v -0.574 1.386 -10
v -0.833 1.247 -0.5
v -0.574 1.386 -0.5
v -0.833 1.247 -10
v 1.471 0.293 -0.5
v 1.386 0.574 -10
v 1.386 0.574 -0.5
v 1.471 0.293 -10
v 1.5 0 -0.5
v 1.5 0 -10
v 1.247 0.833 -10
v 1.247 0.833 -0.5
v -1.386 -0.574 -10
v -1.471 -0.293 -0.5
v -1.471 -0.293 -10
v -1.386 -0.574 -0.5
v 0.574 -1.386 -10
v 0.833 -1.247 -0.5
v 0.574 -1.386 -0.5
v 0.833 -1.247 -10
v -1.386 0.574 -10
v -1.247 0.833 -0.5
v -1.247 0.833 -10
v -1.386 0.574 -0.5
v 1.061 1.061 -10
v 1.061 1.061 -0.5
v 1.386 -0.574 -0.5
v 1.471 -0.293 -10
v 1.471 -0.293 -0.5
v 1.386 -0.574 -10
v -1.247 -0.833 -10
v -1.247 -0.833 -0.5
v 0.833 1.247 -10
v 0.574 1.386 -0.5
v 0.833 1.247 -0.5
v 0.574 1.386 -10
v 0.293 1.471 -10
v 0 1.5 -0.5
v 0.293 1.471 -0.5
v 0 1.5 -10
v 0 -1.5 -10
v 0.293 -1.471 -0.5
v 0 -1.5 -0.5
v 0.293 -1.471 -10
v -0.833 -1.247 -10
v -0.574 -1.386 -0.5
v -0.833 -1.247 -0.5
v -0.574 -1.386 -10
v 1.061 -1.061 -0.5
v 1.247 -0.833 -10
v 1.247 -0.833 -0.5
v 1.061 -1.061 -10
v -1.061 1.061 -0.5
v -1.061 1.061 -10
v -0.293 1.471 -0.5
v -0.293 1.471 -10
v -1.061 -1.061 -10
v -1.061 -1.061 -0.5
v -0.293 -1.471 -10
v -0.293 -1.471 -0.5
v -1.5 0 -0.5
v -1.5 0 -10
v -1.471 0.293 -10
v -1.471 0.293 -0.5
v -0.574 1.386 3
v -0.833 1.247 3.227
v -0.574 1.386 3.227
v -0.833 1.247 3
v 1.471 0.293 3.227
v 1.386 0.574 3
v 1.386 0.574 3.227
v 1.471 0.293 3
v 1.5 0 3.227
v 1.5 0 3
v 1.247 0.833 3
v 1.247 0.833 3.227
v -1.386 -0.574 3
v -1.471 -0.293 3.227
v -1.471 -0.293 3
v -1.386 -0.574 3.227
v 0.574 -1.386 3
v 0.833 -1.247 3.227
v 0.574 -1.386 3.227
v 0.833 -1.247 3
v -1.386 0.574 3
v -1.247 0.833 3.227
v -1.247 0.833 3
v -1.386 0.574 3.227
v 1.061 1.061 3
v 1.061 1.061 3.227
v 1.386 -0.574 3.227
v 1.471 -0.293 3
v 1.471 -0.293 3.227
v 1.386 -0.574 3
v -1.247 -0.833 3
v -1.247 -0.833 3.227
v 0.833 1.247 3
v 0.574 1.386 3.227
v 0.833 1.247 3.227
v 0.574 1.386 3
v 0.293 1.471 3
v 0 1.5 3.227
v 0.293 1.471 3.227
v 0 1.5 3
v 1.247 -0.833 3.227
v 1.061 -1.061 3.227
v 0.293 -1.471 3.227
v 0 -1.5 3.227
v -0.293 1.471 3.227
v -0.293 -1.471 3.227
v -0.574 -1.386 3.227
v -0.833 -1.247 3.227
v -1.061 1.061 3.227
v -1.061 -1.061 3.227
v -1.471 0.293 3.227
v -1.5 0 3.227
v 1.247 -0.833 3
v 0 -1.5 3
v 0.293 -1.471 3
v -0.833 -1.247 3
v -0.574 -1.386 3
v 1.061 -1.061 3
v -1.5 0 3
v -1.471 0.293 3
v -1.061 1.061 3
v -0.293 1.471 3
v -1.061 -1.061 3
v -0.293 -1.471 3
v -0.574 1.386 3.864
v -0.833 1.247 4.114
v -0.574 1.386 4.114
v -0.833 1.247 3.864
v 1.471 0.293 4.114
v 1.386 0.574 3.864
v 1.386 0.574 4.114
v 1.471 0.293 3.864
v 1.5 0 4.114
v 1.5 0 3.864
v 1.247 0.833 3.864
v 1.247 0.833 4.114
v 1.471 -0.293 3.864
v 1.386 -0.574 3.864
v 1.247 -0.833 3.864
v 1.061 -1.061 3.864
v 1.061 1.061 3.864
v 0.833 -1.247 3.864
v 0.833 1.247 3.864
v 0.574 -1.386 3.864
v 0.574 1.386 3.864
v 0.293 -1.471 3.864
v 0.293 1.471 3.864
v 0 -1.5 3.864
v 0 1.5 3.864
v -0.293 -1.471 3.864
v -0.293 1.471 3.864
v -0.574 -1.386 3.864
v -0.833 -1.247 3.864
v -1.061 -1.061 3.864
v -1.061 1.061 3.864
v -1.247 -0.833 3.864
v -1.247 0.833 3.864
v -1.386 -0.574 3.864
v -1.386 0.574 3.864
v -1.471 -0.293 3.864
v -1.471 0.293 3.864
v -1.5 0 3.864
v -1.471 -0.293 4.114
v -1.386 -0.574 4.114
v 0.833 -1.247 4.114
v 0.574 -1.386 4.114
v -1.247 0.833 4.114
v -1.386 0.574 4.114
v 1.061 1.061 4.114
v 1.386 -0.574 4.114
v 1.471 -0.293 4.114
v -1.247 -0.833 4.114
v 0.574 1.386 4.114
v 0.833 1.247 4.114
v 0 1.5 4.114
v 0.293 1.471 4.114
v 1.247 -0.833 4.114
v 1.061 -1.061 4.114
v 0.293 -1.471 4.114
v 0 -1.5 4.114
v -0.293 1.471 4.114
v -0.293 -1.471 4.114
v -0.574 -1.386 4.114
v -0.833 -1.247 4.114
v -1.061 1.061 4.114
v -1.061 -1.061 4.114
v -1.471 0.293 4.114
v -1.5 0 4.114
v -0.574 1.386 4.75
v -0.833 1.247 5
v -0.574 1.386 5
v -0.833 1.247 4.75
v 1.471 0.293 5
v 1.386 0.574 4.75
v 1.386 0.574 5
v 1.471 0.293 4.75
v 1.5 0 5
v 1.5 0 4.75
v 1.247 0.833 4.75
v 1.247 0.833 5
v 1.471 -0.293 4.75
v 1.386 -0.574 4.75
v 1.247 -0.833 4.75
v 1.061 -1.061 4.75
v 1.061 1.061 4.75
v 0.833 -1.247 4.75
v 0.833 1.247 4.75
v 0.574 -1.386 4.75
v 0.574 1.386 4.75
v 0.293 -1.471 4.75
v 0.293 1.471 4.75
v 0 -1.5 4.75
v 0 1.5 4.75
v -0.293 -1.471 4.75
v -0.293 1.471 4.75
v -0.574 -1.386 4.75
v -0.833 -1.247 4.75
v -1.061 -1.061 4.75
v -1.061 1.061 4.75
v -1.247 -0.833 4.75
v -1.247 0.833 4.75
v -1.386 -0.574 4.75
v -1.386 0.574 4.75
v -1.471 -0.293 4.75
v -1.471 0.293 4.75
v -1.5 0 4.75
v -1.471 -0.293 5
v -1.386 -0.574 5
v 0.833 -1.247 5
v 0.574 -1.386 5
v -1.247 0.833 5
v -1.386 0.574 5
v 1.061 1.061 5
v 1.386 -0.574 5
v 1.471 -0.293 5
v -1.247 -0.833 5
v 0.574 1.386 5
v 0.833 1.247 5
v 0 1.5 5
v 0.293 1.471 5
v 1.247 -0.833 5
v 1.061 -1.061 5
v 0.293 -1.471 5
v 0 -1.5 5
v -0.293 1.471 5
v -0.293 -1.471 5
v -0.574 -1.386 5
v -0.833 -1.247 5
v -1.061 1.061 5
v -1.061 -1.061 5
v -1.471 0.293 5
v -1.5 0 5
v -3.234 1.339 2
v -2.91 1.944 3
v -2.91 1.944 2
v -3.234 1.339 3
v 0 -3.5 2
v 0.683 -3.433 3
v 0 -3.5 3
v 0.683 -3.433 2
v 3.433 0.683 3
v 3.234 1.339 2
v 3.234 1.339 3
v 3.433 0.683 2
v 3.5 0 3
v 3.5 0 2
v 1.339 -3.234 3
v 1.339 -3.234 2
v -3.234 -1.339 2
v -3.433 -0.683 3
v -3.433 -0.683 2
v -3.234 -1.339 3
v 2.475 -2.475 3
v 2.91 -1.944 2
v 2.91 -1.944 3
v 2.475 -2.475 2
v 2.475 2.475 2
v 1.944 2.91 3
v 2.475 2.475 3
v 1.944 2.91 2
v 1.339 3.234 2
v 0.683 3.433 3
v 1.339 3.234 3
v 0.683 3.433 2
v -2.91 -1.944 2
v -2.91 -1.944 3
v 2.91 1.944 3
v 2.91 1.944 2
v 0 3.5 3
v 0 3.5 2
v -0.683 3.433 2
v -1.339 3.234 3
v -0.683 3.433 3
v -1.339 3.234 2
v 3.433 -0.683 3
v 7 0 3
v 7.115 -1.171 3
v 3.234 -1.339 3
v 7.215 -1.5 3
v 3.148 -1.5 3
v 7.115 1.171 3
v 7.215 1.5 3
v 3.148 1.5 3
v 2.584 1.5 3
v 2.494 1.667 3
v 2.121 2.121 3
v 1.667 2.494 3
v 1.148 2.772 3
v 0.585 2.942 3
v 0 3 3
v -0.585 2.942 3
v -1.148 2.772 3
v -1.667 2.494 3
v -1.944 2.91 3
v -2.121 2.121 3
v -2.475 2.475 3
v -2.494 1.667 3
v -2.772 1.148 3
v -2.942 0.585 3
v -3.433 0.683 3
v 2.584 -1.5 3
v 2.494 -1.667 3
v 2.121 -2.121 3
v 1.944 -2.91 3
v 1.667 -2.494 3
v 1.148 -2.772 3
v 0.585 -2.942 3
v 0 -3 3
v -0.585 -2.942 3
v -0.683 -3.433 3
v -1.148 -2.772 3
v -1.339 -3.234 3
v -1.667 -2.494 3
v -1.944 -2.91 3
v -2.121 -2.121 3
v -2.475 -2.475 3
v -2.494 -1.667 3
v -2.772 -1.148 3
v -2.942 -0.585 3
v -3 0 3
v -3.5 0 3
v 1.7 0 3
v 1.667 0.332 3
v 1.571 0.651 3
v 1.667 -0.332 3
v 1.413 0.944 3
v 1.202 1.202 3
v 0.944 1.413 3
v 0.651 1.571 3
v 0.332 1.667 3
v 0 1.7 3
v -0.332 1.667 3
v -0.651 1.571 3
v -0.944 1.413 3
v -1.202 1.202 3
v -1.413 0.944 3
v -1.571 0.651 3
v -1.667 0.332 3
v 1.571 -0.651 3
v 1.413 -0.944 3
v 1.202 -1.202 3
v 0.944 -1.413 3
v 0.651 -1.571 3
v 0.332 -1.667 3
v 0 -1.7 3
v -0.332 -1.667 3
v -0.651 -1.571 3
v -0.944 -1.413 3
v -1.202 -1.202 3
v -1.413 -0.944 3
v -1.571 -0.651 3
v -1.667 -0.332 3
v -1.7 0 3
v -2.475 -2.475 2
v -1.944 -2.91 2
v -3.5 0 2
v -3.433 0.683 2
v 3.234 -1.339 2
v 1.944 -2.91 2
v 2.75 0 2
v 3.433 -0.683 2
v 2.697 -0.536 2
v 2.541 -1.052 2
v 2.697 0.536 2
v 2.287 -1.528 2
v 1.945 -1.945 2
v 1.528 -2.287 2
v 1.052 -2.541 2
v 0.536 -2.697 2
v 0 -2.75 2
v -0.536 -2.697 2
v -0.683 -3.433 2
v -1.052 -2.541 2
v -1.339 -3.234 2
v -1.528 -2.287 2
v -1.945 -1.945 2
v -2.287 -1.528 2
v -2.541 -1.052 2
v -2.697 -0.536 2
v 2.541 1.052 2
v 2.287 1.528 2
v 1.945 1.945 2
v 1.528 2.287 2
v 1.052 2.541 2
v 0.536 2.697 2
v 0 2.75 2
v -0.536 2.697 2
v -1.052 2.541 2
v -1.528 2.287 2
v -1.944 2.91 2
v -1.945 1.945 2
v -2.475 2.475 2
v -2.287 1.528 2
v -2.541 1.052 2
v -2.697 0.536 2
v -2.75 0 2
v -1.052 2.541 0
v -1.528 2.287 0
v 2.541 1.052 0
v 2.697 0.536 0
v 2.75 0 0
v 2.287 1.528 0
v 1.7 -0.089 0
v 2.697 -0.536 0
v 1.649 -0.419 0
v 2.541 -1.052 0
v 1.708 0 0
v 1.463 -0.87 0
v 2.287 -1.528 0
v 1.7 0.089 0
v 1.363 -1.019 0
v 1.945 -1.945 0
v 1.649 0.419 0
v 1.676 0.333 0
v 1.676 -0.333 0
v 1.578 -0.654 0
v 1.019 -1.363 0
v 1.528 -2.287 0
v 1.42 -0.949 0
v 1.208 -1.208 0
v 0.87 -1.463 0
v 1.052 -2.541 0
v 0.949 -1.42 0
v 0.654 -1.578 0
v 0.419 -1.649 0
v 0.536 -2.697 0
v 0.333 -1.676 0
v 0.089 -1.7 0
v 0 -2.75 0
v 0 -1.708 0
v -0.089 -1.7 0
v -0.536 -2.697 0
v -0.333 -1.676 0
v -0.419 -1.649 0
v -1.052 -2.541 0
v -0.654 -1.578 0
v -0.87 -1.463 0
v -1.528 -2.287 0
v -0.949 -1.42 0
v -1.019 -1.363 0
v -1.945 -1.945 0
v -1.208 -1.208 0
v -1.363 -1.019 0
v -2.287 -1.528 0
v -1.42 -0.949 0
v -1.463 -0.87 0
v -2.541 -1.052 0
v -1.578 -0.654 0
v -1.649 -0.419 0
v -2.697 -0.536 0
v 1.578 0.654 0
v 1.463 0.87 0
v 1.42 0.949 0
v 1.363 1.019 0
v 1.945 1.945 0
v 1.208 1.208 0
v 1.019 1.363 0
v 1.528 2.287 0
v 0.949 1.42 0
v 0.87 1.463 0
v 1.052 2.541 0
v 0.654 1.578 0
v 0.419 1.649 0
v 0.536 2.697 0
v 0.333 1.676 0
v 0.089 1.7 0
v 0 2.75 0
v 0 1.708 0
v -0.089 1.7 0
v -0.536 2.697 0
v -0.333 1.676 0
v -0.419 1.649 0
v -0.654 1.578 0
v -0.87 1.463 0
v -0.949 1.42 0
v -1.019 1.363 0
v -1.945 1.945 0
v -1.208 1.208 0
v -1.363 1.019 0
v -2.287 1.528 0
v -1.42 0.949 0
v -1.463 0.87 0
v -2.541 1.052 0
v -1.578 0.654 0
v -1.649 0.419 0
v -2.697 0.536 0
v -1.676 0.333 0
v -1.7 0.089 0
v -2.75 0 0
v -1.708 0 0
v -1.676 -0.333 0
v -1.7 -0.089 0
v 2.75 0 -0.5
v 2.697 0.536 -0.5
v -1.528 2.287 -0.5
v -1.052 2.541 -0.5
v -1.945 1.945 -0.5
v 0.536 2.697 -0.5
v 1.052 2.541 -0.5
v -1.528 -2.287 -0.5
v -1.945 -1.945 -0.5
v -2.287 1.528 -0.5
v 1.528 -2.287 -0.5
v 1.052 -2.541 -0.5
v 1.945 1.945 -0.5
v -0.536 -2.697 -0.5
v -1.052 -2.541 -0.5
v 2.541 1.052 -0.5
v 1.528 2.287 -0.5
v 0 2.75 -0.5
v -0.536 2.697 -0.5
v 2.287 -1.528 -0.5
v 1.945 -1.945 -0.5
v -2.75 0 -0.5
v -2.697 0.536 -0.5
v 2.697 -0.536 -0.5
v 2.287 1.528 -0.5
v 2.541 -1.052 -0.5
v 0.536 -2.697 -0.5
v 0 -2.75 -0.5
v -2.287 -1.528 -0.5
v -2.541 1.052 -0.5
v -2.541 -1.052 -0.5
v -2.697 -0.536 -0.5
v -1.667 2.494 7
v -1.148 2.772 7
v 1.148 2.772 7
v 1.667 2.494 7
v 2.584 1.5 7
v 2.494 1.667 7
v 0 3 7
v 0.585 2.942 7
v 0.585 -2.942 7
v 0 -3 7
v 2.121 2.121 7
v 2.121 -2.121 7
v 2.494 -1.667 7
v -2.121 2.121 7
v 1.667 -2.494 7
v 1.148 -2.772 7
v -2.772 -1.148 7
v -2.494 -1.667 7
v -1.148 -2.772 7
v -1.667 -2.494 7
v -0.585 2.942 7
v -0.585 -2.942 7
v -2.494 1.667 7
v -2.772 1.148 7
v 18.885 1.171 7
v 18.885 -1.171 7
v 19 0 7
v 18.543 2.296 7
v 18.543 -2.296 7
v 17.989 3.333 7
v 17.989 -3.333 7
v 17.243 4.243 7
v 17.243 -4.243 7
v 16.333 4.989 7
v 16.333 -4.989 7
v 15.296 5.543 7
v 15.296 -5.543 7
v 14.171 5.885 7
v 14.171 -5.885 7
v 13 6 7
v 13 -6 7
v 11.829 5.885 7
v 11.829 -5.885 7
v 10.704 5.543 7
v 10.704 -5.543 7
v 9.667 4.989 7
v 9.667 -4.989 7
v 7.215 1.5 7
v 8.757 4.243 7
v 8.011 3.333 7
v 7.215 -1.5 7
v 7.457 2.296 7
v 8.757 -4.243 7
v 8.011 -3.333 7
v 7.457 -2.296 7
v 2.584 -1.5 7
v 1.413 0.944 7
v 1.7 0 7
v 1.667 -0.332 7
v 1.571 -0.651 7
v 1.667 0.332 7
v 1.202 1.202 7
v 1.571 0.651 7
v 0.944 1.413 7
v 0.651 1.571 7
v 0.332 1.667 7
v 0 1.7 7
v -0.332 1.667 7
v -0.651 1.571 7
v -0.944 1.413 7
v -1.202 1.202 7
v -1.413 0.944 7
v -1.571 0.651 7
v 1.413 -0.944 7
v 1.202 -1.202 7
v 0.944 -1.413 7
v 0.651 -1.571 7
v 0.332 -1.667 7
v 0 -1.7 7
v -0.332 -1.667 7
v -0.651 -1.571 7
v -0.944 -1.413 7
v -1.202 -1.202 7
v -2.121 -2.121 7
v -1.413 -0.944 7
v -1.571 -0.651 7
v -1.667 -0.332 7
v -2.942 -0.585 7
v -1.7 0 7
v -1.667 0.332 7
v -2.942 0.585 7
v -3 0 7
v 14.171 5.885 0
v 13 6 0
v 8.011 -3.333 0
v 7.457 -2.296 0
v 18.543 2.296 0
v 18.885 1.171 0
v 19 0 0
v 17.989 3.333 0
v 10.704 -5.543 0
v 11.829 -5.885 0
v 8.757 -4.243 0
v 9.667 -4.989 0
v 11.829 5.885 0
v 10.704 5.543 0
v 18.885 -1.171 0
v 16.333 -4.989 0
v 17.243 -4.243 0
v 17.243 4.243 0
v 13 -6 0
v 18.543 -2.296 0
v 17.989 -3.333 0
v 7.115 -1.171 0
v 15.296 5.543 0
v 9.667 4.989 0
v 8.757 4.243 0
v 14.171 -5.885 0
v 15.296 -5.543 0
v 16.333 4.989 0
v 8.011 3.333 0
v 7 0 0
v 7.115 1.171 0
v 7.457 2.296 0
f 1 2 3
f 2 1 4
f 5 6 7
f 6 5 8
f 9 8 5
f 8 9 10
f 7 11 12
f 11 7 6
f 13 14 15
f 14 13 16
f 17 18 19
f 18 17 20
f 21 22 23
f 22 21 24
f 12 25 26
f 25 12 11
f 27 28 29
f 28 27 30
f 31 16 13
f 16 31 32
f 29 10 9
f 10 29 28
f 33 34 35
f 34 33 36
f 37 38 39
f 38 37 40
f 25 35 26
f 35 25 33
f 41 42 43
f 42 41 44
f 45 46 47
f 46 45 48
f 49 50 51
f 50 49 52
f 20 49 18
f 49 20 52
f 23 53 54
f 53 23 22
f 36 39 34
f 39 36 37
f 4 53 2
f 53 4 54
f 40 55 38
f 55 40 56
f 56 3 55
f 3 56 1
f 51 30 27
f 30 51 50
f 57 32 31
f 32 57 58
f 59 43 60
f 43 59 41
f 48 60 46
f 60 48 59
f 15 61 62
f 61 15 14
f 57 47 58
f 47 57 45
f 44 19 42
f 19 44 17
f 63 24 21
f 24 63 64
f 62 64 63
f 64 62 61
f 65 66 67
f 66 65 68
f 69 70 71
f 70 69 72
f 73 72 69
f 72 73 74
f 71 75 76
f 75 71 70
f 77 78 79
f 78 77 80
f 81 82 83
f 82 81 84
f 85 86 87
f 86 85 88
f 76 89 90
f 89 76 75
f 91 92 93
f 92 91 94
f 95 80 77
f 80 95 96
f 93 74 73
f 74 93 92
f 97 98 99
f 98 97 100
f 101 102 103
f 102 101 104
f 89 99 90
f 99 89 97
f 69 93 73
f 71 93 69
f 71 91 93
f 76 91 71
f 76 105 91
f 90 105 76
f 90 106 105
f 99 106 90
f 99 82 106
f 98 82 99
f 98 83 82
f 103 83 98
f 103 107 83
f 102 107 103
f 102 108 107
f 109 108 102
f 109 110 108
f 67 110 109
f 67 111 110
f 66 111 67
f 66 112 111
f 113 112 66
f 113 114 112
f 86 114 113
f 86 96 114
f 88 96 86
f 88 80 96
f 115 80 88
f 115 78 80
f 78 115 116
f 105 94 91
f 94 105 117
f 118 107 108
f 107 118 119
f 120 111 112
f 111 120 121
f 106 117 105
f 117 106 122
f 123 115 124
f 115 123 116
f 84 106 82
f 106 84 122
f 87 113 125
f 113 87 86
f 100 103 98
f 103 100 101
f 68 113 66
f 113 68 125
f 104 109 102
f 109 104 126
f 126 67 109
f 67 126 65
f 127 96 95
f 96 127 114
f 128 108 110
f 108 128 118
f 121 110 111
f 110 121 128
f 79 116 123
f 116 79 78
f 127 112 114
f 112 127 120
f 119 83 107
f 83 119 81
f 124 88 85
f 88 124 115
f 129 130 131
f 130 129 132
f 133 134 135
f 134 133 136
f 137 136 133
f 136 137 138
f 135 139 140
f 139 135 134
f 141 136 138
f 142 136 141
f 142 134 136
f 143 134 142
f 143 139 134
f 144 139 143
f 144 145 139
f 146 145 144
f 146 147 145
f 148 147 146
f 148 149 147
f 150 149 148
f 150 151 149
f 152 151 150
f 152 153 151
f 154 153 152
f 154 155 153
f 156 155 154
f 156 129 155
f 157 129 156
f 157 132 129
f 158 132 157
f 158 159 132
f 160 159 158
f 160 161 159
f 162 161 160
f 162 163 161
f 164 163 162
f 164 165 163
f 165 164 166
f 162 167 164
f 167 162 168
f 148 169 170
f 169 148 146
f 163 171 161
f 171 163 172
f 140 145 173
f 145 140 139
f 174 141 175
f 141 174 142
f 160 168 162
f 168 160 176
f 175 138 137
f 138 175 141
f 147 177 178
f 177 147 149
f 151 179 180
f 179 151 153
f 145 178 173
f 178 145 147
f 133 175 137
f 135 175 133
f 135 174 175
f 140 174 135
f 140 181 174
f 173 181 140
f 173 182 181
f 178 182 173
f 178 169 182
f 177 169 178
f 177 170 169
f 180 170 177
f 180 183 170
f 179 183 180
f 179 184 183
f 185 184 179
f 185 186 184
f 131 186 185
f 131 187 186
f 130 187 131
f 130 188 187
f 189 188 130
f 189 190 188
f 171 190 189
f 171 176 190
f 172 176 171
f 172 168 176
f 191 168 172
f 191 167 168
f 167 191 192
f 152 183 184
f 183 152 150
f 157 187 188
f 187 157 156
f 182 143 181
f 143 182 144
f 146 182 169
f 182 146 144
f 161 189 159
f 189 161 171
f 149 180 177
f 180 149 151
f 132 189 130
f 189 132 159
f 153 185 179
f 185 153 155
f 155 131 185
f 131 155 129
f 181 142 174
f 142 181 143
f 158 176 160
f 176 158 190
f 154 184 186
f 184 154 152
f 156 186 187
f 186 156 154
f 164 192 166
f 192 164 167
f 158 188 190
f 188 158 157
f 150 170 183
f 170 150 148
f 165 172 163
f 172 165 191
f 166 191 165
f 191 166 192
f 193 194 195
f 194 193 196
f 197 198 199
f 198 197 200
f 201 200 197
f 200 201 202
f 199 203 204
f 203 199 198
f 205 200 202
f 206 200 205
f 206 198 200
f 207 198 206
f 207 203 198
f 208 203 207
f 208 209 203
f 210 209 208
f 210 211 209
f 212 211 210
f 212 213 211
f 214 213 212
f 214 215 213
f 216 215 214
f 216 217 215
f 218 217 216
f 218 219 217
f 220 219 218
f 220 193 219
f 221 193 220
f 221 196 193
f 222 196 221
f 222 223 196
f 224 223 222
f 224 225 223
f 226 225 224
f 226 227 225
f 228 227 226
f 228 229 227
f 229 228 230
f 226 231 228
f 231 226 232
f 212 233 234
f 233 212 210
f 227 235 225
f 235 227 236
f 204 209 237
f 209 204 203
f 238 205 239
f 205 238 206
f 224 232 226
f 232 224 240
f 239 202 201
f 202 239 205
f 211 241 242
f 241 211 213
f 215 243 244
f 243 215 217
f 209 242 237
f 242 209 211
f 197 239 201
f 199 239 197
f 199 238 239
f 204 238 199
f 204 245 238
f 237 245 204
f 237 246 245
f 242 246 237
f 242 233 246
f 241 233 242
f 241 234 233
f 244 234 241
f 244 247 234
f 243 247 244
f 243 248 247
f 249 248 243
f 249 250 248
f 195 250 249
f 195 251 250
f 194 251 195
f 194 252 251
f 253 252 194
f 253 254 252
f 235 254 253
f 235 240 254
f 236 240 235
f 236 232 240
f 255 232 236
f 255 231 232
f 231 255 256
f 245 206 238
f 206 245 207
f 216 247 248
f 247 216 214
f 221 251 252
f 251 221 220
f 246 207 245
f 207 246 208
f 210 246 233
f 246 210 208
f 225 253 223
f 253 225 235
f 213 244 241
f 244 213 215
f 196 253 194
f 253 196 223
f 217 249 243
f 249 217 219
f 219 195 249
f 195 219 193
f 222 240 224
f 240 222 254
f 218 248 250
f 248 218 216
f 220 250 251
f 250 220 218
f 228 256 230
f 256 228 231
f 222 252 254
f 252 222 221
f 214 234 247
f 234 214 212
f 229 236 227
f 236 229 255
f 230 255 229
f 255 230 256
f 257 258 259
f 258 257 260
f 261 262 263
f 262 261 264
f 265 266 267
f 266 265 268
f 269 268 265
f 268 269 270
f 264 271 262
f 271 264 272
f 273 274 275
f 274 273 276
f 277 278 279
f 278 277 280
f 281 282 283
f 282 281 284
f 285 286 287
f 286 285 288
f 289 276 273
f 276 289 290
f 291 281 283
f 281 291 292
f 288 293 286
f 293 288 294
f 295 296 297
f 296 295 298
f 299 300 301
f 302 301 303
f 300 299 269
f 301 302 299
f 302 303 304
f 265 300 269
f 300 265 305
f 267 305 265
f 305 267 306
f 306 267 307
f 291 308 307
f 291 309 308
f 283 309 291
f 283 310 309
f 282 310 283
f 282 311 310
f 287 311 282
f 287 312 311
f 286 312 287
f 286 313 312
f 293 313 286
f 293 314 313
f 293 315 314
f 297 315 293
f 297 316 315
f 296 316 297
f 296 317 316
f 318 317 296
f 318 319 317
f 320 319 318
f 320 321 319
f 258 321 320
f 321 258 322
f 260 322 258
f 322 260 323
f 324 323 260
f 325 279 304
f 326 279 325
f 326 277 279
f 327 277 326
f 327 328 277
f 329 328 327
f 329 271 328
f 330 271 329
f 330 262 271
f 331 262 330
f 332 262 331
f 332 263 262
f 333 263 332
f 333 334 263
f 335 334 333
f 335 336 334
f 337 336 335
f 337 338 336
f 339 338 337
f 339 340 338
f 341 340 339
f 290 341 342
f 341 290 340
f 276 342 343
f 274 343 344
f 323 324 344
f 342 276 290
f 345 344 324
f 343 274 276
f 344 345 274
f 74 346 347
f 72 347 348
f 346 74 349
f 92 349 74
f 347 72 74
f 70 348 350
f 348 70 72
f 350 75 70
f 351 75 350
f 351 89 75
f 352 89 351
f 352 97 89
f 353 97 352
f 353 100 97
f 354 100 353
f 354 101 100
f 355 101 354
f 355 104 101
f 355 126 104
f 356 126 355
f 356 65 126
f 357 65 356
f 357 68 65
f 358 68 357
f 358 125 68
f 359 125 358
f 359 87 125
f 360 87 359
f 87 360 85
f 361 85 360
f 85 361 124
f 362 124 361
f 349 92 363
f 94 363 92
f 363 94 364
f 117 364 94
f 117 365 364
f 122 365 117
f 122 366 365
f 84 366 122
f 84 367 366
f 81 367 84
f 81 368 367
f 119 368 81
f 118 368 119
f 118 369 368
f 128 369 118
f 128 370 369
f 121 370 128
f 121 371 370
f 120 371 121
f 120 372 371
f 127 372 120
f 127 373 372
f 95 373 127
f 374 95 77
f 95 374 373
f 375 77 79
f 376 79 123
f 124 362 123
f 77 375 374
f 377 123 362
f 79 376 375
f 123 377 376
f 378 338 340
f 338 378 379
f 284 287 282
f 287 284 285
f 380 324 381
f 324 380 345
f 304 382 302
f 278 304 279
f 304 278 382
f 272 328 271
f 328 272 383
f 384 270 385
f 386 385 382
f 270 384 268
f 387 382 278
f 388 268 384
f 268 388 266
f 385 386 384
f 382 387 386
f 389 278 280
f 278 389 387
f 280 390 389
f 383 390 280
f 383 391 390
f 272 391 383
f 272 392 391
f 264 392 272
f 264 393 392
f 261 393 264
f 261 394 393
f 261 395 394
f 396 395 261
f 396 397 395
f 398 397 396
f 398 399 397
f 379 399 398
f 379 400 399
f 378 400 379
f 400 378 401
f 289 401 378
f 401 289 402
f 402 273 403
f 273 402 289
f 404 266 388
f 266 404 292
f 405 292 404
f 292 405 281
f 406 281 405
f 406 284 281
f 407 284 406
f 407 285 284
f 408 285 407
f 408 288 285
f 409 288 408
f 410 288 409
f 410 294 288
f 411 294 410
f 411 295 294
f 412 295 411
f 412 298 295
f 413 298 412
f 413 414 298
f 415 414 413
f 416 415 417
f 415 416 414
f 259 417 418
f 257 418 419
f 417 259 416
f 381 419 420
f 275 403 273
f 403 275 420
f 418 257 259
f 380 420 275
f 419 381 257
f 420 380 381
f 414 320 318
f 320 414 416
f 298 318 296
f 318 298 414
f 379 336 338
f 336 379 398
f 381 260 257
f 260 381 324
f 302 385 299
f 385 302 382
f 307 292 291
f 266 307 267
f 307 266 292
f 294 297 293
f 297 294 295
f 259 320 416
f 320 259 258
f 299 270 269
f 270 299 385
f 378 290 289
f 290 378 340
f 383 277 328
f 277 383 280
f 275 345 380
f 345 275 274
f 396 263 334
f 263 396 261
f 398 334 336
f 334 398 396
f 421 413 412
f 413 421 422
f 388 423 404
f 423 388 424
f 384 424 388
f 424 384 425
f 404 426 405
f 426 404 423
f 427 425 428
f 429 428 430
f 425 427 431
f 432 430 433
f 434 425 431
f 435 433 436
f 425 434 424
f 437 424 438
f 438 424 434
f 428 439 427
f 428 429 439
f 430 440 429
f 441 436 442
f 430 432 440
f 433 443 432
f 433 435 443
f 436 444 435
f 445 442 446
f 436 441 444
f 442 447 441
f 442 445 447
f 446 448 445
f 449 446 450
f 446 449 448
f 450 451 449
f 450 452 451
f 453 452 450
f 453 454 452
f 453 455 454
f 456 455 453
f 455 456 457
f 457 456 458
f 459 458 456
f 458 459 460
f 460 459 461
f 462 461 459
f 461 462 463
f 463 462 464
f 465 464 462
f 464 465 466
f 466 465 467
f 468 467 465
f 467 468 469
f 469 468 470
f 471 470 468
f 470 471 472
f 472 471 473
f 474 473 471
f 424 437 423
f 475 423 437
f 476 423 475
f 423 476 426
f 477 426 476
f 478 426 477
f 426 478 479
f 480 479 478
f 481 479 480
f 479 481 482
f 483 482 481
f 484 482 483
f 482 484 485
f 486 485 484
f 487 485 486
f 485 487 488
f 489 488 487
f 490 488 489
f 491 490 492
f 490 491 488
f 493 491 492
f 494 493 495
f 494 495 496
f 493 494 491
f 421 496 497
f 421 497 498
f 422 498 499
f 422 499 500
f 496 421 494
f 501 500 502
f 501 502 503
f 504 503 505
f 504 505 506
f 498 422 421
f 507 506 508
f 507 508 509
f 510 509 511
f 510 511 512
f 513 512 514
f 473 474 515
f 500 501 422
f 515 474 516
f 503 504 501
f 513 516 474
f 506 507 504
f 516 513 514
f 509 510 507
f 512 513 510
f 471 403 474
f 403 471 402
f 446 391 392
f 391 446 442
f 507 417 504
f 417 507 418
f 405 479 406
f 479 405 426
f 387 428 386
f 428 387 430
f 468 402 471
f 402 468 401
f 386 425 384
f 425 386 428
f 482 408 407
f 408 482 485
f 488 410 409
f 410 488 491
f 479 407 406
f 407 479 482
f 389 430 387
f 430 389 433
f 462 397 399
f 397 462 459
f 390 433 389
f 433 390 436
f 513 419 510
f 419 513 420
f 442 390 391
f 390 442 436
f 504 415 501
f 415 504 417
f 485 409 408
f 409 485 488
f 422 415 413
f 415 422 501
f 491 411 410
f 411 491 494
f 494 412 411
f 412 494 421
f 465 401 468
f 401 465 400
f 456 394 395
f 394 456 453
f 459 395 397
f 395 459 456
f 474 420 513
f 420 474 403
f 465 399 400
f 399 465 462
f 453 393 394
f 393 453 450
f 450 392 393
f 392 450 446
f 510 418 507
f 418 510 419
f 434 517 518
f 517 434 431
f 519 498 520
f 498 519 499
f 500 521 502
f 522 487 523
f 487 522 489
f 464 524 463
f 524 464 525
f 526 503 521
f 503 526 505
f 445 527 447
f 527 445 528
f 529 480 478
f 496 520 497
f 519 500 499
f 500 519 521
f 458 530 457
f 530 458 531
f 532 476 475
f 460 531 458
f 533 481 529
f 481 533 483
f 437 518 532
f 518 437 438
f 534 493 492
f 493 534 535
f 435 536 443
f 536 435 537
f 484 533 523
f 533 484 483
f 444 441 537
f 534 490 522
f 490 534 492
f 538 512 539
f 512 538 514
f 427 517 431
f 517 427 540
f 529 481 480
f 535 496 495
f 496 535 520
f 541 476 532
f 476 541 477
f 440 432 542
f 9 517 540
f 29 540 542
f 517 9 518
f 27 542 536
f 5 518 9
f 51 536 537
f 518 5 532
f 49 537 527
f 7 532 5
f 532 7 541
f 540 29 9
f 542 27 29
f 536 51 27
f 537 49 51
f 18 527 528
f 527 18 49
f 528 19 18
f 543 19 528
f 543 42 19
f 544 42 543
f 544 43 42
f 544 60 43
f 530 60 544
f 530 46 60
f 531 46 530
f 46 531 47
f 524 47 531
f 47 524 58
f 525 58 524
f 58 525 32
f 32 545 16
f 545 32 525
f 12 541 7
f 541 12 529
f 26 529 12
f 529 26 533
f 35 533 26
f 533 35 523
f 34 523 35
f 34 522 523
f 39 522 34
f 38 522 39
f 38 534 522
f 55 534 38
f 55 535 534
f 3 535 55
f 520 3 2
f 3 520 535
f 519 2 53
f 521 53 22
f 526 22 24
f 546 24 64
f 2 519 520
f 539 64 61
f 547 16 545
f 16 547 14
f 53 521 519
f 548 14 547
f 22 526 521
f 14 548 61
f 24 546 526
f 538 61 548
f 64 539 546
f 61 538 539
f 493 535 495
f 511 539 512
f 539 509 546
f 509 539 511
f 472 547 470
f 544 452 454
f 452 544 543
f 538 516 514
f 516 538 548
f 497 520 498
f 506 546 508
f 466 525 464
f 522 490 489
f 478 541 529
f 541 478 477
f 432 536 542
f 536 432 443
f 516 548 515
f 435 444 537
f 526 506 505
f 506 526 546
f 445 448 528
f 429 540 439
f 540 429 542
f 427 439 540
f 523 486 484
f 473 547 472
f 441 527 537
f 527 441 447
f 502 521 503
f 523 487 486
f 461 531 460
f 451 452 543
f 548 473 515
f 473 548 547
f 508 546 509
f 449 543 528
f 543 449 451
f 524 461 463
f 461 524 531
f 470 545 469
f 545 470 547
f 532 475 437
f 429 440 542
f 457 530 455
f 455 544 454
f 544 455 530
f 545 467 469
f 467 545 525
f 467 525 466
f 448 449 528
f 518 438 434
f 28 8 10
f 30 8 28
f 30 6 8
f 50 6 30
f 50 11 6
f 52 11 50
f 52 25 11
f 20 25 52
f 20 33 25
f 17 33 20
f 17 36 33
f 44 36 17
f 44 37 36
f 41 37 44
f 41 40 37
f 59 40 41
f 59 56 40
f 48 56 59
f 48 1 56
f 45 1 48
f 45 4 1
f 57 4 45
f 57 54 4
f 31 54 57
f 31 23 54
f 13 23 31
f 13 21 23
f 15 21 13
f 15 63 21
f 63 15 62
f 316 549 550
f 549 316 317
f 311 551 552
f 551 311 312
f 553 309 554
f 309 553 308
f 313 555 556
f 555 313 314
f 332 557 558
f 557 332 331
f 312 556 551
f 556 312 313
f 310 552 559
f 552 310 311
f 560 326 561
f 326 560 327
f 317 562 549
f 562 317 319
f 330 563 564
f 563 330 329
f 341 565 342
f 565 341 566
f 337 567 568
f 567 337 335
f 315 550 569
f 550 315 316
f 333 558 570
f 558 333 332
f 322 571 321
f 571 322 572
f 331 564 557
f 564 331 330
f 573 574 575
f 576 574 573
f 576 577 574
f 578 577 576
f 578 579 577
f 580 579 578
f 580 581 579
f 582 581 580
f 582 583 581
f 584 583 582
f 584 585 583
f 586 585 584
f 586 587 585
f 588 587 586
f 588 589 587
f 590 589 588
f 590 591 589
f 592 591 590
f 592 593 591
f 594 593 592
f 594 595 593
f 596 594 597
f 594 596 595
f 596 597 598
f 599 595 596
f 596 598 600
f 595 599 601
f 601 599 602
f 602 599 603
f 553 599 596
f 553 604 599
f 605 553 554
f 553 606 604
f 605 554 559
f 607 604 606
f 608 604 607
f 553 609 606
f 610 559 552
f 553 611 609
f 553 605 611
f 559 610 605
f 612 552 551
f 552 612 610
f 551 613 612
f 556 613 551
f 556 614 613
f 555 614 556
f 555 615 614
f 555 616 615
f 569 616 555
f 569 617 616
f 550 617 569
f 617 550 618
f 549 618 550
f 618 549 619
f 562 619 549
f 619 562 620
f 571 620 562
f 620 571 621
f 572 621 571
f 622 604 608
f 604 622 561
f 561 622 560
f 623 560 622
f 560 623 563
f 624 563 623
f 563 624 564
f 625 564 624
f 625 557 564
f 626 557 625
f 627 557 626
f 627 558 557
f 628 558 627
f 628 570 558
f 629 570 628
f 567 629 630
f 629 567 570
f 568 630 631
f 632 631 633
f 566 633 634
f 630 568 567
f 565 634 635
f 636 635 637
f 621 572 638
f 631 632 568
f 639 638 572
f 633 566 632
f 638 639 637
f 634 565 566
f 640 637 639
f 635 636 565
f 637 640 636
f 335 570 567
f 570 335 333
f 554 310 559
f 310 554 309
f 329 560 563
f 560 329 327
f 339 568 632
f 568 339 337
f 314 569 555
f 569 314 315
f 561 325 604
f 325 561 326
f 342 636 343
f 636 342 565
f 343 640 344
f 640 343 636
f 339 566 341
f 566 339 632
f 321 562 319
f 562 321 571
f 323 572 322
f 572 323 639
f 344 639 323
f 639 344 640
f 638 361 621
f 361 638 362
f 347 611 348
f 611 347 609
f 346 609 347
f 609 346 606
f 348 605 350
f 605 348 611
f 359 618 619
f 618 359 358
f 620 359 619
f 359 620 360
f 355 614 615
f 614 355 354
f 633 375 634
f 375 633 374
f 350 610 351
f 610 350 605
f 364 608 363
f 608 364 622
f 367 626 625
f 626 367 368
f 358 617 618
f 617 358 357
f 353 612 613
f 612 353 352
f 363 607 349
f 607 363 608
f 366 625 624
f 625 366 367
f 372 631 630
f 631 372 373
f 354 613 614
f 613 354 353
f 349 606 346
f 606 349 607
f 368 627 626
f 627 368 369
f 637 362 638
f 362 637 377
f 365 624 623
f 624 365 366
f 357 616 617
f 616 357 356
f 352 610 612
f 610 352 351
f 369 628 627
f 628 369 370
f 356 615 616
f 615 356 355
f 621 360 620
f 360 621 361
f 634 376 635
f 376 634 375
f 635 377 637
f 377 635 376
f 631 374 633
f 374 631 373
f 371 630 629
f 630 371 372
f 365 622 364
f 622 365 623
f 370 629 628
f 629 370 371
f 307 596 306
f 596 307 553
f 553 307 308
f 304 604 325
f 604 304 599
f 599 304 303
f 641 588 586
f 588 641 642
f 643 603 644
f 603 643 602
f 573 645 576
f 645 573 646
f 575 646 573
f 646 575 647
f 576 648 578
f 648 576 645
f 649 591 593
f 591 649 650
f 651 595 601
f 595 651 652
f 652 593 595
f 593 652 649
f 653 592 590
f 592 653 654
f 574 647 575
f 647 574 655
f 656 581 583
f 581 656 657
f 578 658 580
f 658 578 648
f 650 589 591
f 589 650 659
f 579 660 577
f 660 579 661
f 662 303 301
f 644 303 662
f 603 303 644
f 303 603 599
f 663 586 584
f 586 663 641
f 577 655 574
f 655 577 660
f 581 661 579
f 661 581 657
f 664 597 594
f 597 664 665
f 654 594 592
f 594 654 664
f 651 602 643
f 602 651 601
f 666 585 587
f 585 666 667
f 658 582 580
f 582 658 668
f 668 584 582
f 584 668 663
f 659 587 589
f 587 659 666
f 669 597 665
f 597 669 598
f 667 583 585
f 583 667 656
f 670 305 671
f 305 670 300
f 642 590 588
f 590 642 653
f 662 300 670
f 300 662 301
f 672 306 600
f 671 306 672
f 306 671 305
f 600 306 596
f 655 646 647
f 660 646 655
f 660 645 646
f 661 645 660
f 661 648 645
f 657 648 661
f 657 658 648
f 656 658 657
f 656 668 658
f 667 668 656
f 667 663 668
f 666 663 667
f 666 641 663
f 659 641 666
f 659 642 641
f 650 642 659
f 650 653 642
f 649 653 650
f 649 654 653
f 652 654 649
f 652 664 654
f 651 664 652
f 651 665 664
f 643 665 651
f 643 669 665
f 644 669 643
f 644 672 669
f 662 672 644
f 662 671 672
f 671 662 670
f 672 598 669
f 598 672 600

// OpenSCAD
// Parameters
thread_major_diameter_mm = 3; //[1.5:6:0.1]
overall_length_mm = 10; //[5:20:0.5]
head_diameter_mm = 5.5; //[2.75:11:0.1]
head_height_mm = 3; //[1.5:6:0.1]
thread_pitch_mm = 0.5; //[0.25:1:0.05]
thread_length_mm = 10; //[5:20:0.5]
socket_across_flats_mm = 2.5; //[1.25:5:0.05]
socket_depth_mm = 1.5; //[0.75:3:0.05]
chamfer_under_head_mm = 0.6; //[0.3:1.2:0.05]
thread_minor_diameter_mm = 2.6; //[1.3:5.2:0.1]
thread_ridge_height_mm = 0.2; //[0.1:0.4:0.05]
thread_ridge_width_mm = 0.25; //[0.1:0.6:0.05]
thread_ridge_count = 12; //[6:30:1]
washer_outer_diameter_mm = 7; //[3.5:14:0.1]
washer_thickness_mm = 1; //[0.5:2:0.1]
washer_hole_diameter_mm = 3.4; //[1.7:6.8:0.1]
pcb_spacer_outer_diameter_mm = 6; //[3:12:0.1]
pcb_spacer_height_mm = 5; //[2.5:10:0.5]
pcb_spacer_hole_diameter_mm = 3.4; //[1.7:6.8:0.1]
pin_socket_body_length_mm = 6; //[3:12:0.5]
pin_socket_body_width_mm = 3; //[1.5:6:0.5]
pin_socket_body_height_mm = 4; //[2:8:0.5]
buzzer_diameter_mm = 12; //[6:24:0.5]
buzzer_height_mm = 7; //[3.5:14:0.5]
assembly_overlap_mm = 1; //[0.5:2:0.1]

// Pin Socket - Detailed Geometry
module pin_socket() {
  color("DimGray")
    cube([pin_socket_body_length_mm, pin_socket_body_width_mm, pin_socket_body_height_mm], center=true);
}

// Screw and Washer - Detailed Geometry
module screw_and_washer() {
  color("Silver") {
    // Cap Head
    translate([0, 0, head_height_mm/2])
      cylinder(r=head_diameter_mm/2, h=head_height_mm, center=true, $fn=32);

    // Hex Socket Recess (visual only; not subtracted)
    translate([0, 0, head_height_mm - socket_depth_mm/2])
      cylinder(r=(socket_across_flats_mm/2)/cos(30), h=socket_depth_mm, center=true, $fn=6);

    // Under Head Chamfer (overlaps head + shaft slightly)
    translate([0, 0, chamfer_under_head_mm/2 - assembly_overlap_mm/2])
      cylinder(r1=head_diameter_mm/2, r2=thread_major_diameter_mm/2, h=chamfer_under_head_mm, center=true, $fn=32);

    // Screw Body (major diameter)
    translate([0, 0, -overall_length_mm/2])
      cylinder(r=thread_major_diameter_mm/2, h=overall_length_mm, center=true, $fn=32);

    // Threaded Shaft Core (minor diameter)
    translate([0, 0, -thread_length_mm/2])
      cylinder(r=thread_minor_diameter_mm/2, h=thread_length_mm, center=true, $fn=32);

    // Thread Ridges
    for (i = [0:thread_ridge_count-1]) {
      translate([0, 0,
        -thread_length_mm/2
        + thread_ridge_width_mm/2
        + i*(thread_length_mm-thread_ridge_width_mm)/(thread_ridge_count-1)
      ])
        cylinder(r=thread_minor_diameter_mm/2 + thread_ridge_height_mm,
                 h=thread_ridge_width_mm, center=true, $fn=32);
    }

    // Washer (kept overlapping head slightly for guaranteed union)
    difference() {
      translate([0, 0, head_height_mm + washer_thickness_mm/2 - assembly_overlap_mm])
        cylinder(r=washer_outer_diameter_mm/2, h=washer_thickness_mm, center=true, $fn=32);
      translate([0, 0, head_height_mm + washer_thickness_mm/2 - assembly_overlap_mm])
        cylinder(r=washer_hole_diameter_mm/2, h=washer_thickness_mm + 2*assembly_overlap_mm, center=true, $fn=32);
    }
  }
}

// PCB Spacer - Detailed Geometry
module pcb_spacer() {
  color("Silver") {
    difference() {
      translate([0, 0, head_height_mm + washer_thickness_mm - 2*assembly_overlap_mm + pcb_spacer_height_mm/2])
        cylinder(r=pcb_spacer_outer_diameter_mm/2, h=pcb_spacer_height_mm, center=true, $fn=32);
      translate([0, 0, head_height_mm + washer_thickness_mm - 2*assembly_overlap_mm + pcb_spacer_height_mm/2])
        cylinder(r=pcb_spacer_hole_diameter_mm/2, h=pcb_spacer_height_mm + 2*assembly_overlap_mm, center=true, $fn=32);
    }
  }
}

// Buzzer - Detailed Geometry
module buzzer() {
  color("Black")
    cylinder(r=buzzer_diameter_mm/2, h=buzzer_height_mm, center=true, $fn=32);
}

// NEW: Connecting arm to guarantee physical attachment between pin socket and buzzer
module connecting_arm(arm_len, arm_w, arm_h) {
  color("DimGray")
    cube([arm_len, arm_w, arm_h], center=true);
}

// Assembly (ALL parts unioned and physically connected with overlap)
module assembly() {
  // Z placement (kept as in original intent)
  z_pin = head_height_mm + washer_thickness_mm - 2*assembly_overlap_mm + pcb_spacer_height_mm - pin_socket_body_height_mm/2;
  z_buz = head_height_mm + washer_thickness_mm - 2*assembly_overlap_mm + pcb_spacer_height_mm - buzzer_height_mm/2;

  // X placement: pin socket near spacer
  x_pin = pcb_spacer_outer_diameter_mm/2 + pin_socket_body_length_mm/2 - assembly_overlap_mm;

  // Force buzzer to overlap the pin socket by assembly_overlap_mm (no gap)
  // Condition: (x_buz - buzzer_r) = (x_pin + pin_L/2) - overlap
  x_buz = x_pin + pin_socket_body_length_mm/2 + buzzer_diameter_mm/2 - assembly_overlap_mm;

  // Add a connecting arm that overlaps BOTH the pin socket and the buzzer by assembly_overlap_mm
  // Left face of arm:  x_pin + pin_L/2 - overlap
  // Right face of arm: x_buz - buzzer_r + overlap
  x_arm_left  = x_pin + pin_socket_body_length_mm/2 - assembly_overlap_mm;
  x_arm_right = x_buz - buzzer_diameter_mm/2 + assembly_overlap_mm;

  arm_len = max(0.01, x_arm_right - x_arm_left);
  x_arm = (x_arm_left + x_arm_right)/2;

  // Match pin socket cross-section so it visually "continues" and guarantees contact
  arm_w = pin_socket_body_width_mm;
  arm_h = pin_socket_body_height_mm;
  z_arm = z_pin; // align with pin socket center for solid connection

  union() {
    screw_and_washer();
    pcb_spacer();

    translate([x_pin, 0, z_pin])
      pin_socket();

    // Connecting arm ensures buzzer is physically attached (fixes floating/gap)
    translate([x_arm, 0, z_arm])
      connecting_arm(arm_len, arm_w, arm_h);

    // Buzzer attached (overlaps pin socket and arm by assembly_overlap_mm)
    translate([x_buz, 0, z_buz])
      buzzer();
  }
}

assembly();
